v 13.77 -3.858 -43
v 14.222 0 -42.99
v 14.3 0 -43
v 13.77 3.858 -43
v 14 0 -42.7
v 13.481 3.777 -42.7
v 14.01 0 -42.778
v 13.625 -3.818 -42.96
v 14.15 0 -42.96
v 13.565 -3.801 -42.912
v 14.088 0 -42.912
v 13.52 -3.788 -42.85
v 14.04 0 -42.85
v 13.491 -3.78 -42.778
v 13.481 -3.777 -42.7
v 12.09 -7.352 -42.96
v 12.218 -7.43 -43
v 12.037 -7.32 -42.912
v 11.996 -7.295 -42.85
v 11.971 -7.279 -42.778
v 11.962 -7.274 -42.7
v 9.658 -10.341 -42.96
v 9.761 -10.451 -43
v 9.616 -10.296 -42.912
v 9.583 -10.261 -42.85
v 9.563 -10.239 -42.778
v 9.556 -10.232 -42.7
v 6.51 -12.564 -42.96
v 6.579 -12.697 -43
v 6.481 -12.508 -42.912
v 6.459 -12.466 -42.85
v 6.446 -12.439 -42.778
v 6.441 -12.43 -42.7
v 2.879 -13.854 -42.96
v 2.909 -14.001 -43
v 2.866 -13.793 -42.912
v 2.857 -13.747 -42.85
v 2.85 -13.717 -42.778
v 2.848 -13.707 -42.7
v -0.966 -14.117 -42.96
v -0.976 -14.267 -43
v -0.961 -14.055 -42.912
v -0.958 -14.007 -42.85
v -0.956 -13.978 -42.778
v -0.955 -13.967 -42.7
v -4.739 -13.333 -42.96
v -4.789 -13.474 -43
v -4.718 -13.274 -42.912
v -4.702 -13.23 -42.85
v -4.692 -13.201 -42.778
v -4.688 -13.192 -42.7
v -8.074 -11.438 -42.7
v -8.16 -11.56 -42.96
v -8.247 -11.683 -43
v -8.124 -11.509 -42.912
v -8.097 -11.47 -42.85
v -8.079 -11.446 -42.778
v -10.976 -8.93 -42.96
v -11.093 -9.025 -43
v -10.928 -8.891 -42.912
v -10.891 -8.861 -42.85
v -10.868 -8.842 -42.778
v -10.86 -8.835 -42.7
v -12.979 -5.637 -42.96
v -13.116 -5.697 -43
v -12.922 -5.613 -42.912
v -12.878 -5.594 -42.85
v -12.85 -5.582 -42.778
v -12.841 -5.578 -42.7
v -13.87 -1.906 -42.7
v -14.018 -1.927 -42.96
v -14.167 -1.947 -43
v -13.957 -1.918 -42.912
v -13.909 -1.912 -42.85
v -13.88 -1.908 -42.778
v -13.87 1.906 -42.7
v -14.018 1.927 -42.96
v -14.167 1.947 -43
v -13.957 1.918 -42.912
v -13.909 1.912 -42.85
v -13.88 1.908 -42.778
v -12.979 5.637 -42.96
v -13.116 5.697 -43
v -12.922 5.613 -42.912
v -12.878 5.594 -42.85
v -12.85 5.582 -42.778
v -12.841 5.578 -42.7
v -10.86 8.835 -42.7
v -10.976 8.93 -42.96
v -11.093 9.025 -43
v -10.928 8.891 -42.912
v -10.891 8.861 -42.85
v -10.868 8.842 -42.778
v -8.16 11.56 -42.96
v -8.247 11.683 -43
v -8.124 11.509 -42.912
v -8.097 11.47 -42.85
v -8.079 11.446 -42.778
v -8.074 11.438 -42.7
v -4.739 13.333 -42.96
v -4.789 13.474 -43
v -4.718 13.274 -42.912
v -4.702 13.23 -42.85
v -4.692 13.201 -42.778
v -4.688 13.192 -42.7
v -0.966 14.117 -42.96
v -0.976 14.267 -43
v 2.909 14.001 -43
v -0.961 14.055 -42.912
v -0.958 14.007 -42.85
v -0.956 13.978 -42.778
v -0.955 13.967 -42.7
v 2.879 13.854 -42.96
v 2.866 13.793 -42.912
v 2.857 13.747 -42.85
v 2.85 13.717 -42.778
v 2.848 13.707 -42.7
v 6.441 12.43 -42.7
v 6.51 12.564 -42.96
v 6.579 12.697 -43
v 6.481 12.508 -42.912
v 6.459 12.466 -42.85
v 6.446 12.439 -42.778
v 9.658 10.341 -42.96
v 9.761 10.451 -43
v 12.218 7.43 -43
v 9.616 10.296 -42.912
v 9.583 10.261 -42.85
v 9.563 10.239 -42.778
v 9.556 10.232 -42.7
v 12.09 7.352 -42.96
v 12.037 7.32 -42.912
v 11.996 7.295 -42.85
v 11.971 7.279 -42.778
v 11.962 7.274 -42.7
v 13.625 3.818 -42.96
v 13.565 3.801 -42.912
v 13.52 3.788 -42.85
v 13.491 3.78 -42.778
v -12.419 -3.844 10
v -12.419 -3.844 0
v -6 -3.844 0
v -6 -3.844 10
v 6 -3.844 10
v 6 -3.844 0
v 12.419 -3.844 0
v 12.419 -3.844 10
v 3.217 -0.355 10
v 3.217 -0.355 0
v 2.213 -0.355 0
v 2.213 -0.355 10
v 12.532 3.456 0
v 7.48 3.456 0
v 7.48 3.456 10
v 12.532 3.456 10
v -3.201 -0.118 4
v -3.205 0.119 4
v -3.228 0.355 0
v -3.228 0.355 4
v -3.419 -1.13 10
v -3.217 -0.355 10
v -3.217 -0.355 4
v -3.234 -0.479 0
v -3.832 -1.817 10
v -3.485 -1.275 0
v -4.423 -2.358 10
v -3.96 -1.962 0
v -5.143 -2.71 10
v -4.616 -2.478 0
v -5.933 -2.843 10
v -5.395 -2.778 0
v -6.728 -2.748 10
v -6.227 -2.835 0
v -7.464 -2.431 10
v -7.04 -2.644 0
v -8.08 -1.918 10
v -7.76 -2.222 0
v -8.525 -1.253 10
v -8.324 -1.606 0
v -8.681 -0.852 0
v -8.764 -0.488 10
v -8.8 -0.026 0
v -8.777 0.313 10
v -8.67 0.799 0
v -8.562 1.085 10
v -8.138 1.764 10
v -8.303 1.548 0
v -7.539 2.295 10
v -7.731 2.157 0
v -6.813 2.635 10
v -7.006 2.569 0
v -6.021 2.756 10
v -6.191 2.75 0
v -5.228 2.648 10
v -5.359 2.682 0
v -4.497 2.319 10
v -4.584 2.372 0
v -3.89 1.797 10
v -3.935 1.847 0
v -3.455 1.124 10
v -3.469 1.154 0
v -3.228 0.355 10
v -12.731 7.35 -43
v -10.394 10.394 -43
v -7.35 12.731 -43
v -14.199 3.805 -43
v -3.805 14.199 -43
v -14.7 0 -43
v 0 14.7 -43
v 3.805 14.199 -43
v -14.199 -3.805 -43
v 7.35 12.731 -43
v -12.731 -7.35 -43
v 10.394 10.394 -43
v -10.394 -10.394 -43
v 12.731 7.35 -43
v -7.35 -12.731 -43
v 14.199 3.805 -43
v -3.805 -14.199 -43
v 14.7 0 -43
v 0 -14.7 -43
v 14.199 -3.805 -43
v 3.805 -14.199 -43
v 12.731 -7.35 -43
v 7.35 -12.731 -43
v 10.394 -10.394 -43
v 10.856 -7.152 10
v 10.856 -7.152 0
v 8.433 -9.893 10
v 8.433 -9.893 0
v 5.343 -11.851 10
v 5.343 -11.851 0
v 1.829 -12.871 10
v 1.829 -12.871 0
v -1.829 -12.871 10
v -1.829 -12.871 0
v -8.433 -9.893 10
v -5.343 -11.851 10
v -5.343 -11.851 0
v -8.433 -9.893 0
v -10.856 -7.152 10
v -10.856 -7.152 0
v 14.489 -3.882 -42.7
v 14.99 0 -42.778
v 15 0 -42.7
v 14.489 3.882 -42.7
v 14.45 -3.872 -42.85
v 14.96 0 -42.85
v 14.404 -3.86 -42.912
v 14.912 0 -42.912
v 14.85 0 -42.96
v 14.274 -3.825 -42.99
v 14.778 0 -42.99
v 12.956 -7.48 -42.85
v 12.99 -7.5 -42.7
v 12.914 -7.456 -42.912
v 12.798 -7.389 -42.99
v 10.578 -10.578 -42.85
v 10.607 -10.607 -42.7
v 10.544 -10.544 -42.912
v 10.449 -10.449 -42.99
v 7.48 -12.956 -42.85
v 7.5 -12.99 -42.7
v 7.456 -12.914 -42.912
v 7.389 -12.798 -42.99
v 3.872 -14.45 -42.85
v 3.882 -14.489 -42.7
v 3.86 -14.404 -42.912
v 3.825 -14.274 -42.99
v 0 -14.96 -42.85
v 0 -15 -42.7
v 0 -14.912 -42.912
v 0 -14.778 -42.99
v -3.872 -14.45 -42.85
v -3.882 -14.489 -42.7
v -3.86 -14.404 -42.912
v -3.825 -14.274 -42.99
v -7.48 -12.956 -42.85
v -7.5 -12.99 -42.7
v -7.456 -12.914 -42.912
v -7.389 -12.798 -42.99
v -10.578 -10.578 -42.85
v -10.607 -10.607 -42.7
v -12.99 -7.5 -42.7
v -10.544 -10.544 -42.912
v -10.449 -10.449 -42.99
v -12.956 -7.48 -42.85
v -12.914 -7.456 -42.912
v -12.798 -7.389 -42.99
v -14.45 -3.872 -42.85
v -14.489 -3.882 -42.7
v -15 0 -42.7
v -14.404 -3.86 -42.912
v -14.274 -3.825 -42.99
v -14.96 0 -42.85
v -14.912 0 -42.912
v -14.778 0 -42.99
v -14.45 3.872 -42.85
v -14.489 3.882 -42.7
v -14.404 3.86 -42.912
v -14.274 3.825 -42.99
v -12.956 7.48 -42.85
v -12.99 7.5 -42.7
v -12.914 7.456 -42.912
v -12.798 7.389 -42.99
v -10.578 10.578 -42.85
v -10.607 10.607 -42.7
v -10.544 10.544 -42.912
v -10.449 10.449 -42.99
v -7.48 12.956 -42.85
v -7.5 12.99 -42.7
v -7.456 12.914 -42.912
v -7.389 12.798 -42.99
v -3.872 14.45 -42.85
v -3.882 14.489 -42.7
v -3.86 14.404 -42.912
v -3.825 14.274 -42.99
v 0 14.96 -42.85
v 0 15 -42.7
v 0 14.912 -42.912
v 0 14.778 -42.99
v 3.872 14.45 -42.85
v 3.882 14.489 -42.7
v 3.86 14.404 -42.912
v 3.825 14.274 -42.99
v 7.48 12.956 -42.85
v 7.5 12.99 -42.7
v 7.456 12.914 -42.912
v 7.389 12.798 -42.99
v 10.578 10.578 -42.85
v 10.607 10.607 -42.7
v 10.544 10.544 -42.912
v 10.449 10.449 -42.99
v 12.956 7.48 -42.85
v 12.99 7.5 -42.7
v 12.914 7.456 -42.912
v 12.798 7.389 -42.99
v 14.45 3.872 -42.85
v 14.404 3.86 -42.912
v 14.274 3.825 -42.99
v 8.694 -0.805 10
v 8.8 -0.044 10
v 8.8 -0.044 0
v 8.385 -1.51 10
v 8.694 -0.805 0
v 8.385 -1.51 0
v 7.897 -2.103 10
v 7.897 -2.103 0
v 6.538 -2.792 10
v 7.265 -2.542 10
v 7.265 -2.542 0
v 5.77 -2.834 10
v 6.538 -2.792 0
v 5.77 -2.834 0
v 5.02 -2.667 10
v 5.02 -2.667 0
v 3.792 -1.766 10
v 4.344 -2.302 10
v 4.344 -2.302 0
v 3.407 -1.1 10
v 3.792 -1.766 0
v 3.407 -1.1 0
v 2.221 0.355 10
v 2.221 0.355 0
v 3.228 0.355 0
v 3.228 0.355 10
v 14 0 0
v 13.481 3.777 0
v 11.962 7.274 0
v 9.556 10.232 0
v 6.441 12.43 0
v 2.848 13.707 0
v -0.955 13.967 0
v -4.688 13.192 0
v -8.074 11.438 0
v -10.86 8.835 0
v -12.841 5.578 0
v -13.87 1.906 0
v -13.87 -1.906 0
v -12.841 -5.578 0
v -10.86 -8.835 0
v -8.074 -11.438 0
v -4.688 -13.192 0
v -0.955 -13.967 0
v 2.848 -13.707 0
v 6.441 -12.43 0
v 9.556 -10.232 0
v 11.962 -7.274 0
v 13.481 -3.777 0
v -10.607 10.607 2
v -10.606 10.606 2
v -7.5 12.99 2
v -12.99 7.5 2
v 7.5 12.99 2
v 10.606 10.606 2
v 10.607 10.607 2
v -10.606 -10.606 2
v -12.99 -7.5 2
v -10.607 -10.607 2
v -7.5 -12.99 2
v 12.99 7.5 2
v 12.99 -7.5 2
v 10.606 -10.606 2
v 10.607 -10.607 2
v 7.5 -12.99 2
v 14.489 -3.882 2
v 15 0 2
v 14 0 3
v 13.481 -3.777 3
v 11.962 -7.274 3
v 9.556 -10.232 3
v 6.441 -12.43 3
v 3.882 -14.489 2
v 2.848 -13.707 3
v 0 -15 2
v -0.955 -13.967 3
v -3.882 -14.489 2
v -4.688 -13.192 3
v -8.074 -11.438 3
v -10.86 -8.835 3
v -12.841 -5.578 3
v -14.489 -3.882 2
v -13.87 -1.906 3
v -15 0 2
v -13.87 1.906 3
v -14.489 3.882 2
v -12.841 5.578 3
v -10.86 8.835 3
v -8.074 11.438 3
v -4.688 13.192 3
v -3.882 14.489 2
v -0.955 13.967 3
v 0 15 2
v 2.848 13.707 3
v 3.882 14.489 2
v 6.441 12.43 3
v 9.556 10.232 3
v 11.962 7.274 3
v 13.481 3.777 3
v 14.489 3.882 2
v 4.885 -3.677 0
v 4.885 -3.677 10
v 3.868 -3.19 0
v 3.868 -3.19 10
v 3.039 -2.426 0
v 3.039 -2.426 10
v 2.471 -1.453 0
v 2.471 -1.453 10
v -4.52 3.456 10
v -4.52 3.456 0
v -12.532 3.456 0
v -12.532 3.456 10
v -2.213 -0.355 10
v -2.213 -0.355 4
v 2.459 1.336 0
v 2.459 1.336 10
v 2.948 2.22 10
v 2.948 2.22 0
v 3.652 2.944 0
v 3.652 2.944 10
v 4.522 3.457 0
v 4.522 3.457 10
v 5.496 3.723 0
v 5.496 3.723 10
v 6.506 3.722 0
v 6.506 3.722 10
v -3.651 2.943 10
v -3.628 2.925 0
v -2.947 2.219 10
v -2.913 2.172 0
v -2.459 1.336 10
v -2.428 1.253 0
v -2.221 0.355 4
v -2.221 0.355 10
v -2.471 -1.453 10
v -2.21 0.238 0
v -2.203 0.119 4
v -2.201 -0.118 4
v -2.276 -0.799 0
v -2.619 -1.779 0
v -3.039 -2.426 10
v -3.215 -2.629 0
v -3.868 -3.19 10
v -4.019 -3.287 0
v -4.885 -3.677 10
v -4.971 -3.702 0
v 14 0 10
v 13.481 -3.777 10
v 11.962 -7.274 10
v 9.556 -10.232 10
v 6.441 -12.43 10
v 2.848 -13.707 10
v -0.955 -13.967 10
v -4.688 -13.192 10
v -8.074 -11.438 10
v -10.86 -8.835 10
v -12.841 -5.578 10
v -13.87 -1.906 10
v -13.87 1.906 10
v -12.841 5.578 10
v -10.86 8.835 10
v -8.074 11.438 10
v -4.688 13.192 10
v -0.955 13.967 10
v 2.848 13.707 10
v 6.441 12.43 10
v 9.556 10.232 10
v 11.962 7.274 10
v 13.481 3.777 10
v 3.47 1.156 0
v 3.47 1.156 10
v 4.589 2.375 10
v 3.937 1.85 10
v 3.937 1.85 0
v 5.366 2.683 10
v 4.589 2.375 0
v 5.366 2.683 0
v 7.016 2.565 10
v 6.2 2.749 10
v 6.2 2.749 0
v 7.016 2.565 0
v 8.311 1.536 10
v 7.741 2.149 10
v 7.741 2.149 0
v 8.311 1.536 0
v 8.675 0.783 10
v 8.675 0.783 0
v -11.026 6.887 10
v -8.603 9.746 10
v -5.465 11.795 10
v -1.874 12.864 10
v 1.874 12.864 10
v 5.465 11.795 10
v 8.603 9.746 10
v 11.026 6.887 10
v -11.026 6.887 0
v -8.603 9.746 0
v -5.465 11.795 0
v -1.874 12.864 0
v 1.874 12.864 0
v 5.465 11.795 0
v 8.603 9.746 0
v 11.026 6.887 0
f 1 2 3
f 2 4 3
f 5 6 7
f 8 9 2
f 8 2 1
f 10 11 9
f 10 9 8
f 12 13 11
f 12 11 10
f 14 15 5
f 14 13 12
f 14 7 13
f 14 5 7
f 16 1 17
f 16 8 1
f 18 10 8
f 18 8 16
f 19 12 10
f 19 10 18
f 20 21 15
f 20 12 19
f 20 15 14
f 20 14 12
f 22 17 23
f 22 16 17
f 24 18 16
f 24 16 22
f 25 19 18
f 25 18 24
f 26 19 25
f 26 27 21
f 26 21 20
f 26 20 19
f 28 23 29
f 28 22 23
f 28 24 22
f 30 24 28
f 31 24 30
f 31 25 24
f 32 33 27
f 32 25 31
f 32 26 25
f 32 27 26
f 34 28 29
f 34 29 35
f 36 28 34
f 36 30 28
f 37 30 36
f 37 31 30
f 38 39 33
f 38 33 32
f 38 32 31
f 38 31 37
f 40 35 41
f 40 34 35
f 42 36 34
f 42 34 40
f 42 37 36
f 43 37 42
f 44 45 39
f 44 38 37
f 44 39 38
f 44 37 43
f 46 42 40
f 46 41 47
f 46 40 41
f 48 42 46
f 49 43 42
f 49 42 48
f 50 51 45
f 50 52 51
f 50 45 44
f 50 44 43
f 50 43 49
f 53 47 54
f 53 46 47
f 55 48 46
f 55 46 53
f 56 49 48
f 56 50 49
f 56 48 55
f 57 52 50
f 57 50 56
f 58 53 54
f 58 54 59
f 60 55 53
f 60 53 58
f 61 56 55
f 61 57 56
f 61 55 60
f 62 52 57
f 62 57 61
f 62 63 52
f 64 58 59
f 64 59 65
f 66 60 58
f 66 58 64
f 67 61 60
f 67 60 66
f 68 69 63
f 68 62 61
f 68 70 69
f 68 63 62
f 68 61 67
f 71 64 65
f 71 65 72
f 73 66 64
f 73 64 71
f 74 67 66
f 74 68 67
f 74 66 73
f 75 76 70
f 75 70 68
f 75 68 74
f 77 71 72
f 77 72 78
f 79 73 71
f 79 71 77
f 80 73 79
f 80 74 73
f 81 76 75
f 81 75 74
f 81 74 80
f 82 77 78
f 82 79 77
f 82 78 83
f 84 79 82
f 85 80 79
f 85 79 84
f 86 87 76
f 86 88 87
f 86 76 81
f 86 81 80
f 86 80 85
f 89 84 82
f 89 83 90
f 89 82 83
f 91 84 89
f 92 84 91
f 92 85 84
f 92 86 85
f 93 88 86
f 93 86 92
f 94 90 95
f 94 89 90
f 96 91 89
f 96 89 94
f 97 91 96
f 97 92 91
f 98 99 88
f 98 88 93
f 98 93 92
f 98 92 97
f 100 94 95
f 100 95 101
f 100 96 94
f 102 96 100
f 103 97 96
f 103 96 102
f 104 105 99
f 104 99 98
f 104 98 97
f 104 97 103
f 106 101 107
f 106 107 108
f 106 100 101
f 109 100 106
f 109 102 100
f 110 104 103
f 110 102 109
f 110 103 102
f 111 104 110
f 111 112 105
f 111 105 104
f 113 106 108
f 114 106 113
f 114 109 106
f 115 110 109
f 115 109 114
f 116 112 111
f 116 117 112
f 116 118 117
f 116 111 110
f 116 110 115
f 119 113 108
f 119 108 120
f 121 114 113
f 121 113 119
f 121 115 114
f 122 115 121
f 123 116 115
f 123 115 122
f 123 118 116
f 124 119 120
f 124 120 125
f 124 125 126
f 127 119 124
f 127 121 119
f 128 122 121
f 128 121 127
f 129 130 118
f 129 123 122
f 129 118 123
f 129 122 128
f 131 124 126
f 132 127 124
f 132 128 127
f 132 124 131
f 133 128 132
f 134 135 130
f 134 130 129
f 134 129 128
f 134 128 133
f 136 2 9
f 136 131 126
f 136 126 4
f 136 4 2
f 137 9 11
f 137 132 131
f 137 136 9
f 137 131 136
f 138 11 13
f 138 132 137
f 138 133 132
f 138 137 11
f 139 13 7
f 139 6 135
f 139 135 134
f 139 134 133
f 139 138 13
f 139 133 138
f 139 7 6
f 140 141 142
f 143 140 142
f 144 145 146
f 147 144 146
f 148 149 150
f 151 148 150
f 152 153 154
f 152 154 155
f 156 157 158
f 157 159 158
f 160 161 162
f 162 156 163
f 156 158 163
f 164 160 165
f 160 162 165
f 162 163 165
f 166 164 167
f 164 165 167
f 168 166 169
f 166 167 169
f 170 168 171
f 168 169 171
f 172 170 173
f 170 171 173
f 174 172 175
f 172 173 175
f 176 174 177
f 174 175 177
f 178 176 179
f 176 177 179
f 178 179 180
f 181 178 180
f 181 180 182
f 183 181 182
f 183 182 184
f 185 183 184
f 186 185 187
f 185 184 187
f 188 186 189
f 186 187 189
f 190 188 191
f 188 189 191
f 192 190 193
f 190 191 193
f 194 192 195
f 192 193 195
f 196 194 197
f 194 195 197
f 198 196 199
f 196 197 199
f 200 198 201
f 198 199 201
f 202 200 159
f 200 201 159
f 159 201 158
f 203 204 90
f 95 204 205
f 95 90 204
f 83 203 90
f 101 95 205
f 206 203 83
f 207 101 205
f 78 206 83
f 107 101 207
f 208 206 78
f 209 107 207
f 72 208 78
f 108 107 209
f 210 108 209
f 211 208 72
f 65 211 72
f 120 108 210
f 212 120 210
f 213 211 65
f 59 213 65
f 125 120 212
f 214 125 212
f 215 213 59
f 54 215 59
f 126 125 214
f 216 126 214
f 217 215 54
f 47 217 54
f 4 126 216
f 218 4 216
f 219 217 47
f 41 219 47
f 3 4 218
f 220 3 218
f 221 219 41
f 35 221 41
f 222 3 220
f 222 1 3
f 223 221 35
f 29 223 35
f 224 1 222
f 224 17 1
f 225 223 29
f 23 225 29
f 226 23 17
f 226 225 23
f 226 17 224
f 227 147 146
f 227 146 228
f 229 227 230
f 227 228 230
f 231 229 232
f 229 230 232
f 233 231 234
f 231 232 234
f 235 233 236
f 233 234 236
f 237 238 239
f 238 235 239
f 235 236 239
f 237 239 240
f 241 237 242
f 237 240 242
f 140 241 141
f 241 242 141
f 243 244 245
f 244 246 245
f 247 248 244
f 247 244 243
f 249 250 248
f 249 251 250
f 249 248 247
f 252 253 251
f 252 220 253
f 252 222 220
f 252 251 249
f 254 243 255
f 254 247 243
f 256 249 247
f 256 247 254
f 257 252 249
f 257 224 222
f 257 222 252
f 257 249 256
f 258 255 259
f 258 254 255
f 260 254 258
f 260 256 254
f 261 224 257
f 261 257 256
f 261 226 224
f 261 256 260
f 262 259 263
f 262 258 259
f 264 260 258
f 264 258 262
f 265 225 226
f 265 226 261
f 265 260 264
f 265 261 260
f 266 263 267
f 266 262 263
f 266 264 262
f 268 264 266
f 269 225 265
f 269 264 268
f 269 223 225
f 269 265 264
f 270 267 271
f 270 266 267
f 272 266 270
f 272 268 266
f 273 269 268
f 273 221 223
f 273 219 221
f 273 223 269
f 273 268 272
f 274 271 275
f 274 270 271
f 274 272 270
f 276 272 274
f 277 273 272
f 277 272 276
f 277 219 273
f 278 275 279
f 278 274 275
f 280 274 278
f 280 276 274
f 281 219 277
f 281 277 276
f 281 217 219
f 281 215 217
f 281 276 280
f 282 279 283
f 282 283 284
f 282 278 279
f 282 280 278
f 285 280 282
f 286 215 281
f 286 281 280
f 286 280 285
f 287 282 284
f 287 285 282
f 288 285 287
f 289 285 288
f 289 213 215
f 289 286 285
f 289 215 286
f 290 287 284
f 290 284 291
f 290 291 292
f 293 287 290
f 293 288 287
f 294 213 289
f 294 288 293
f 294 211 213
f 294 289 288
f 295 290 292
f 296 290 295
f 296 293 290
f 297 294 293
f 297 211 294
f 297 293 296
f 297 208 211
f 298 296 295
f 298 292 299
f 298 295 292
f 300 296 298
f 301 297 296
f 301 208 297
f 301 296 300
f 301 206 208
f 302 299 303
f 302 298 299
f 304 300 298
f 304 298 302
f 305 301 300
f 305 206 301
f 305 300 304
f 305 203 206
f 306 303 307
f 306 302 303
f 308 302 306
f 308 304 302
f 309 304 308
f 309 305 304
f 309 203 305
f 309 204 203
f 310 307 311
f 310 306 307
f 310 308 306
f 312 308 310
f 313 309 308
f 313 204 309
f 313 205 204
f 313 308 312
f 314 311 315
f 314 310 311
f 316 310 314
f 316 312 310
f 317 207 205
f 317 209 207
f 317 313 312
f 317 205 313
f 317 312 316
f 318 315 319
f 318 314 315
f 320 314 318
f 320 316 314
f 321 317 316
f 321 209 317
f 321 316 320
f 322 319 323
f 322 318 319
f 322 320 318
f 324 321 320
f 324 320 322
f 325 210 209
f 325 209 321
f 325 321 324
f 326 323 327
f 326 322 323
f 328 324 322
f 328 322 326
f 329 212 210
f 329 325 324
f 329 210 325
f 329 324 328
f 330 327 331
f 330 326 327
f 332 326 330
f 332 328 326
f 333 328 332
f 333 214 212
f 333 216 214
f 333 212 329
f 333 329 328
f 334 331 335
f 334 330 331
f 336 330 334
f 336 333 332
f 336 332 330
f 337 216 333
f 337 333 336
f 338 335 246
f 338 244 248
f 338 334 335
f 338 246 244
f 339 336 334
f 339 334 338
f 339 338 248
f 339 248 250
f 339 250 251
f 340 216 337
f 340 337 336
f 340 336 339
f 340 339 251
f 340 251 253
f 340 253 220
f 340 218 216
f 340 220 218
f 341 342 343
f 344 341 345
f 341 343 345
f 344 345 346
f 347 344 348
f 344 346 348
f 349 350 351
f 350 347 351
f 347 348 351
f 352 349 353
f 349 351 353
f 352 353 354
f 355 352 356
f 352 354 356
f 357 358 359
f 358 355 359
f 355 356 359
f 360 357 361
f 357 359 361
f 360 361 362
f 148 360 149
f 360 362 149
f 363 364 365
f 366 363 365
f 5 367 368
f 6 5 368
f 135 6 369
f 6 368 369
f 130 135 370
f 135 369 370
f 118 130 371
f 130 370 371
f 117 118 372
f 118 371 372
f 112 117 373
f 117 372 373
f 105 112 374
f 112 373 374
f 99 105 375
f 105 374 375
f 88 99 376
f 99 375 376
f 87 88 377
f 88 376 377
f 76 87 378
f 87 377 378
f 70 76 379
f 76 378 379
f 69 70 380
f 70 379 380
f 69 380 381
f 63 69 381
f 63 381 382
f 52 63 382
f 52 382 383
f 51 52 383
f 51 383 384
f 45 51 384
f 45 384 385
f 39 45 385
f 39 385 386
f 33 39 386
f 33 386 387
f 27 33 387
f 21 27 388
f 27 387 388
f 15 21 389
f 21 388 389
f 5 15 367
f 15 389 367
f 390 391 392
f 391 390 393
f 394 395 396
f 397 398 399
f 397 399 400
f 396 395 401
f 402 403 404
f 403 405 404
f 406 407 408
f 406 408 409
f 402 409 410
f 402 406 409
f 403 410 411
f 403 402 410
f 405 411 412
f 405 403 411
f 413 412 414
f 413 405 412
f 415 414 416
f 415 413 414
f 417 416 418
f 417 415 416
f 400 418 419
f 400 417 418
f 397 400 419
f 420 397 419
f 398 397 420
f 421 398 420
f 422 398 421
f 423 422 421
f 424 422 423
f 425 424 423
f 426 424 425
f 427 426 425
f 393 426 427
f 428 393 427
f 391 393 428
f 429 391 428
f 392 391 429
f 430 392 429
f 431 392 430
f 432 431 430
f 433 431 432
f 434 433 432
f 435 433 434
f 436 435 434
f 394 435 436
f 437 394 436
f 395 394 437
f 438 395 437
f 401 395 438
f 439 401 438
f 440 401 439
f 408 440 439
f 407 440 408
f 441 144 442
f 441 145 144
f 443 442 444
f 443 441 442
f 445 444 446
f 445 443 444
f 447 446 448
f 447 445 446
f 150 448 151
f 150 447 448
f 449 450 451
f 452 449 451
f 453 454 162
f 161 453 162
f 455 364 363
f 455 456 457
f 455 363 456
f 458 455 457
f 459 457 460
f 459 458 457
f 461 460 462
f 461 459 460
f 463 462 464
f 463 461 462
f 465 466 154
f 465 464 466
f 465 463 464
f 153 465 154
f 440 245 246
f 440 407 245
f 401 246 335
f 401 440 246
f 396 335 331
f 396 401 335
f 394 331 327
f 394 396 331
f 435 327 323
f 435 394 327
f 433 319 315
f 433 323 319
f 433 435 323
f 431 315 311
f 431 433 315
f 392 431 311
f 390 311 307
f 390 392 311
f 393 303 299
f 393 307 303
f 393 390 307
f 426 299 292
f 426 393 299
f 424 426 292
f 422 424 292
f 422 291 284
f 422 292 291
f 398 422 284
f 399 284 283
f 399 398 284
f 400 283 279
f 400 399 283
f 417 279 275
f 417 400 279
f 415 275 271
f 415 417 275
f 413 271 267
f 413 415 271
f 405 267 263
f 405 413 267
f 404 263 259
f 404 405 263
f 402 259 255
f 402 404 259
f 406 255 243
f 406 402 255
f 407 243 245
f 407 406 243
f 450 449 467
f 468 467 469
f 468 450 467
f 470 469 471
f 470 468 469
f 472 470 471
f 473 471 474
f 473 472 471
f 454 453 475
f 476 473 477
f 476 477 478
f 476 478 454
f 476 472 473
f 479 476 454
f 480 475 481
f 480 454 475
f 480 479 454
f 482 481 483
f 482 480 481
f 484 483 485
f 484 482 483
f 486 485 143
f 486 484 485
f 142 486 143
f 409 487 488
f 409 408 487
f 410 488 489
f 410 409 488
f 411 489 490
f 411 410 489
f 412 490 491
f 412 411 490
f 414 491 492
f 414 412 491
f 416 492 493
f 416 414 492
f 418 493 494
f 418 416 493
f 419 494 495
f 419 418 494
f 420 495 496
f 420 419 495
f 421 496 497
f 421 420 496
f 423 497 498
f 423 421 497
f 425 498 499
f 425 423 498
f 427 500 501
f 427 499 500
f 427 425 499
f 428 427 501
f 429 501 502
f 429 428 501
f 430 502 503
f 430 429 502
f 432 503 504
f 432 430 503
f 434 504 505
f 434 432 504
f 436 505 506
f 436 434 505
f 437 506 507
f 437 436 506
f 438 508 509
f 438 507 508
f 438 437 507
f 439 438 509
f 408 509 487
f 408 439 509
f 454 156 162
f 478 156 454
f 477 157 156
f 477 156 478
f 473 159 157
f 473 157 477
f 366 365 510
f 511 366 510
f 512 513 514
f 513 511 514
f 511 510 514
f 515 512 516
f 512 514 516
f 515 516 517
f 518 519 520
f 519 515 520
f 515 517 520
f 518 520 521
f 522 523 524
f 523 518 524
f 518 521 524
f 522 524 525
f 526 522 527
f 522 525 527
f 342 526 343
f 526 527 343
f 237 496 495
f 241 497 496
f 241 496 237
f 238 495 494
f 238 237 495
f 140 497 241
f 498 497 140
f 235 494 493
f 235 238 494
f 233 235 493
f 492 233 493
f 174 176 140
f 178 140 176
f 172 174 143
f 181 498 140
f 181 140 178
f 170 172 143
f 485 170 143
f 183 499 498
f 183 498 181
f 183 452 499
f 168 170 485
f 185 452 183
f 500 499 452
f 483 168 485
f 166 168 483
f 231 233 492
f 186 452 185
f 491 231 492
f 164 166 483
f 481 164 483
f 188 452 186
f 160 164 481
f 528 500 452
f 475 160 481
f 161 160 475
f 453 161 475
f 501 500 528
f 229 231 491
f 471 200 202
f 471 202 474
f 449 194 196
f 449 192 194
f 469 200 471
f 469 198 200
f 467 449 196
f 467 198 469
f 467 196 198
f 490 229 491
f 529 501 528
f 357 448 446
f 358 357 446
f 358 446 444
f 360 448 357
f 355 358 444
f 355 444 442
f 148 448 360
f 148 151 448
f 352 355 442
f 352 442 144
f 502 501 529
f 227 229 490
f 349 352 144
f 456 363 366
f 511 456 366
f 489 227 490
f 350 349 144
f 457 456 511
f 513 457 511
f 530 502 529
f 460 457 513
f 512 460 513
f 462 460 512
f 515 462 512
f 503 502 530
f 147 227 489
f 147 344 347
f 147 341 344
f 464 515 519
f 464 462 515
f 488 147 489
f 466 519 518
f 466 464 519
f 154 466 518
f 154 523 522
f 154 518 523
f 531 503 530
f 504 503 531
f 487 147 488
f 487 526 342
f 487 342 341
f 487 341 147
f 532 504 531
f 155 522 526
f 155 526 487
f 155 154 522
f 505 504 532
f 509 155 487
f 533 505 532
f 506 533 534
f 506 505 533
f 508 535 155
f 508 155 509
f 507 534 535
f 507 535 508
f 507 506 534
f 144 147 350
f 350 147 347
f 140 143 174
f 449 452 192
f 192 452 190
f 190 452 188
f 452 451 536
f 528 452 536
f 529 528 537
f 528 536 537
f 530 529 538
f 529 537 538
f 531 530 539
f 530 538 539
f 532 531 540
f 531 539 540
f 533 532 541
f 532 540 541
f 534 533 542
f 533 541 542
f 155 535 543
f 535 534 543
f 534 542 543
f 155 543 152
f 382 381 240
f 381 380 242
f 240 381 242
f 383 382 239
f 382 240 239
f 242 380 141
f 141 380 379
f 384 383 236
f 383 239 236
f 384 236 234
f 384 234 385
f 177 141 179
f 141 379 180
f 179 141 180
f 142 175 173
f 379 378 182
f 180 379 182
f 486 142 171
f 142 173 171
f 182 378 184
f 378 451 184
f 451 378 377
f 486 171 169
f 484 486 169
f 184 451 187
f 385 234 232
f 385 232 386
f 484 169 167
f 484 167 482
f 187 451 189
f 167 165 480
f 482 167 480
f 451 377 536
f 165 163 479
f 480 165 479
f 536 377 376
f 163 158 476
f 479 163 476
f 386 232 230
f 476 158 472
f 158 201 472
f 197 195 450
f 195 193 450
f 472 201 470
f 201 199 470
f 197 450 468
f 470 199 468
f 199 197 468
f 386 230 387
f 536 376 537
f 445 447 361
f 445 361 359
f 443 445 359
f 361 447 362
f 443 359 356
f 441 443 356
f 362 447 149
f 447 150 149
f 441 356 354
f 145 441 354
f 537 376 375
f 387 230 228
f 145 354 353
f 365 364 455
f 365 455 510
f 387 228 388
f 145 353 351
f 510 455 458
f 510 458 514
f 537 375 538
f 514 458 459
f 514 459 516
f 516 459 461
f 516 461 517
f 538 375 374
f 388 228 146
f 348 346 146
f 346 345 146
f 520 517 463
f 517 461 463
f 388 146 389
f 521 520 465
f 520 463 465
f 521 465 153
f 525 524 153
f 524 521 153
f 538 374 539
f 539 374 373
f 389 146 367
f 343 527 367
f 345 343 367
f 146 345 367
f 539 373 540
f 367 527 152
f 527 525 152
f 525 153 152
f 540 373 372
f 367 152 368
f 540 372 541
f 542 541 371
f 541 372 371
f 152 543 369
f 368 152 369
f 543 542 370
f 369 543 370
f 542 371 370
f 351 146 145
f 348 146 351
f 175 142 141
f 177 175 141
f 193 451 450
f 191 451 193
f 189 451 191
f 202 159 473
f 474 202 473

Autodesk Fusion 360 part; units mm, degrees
sketch "Sketch1" plane through (0, 0, 0) normal (0, 0, 1) x (1, 0, 0)
  circle A0 centre (0, 0) radius 13
  circle A1 centre (0, 0) radius 14
  circle A2 centre (0, 0) radius 6 construction
  line L0 (-18, -0.0439) -> (20, -0.0439) construction
  line L1 (0, 17) -> (0, -15) construction
  circle A3 centre (-5.9998, -0.0439) radius 2.8
  circle A4 centre (5.9998, -0.0439) radius 2.8
  circle A5 centre (5.9998, -0.0439) radius 3.8
  circle A6 centre (-5.9998, -0.0439) radius 3.8
  line L2 (-18, -0.0439) -> (-18, 3.4561) construction
  line L3 (-18, 3.4561) -> (29, 3.4561) construction
  line L4 (-25, -0.3439) -> (-25, -3.8439) construction
  line L5 (-25, -3.8439) -> (28, -3.8439) construction
  line L6 (-4.52, 3.4561) -> (-12.5322, 3.4561)
  line L7 (-12.4187, -3.8439) -> (-5.9998, -3.8439)
  line L8 (7.4797, 3.4561) -> (12.5322, 3.4561)
  line L9 (5.9998, -3.8439) -> (12.4187, -3.8439)
  line L10 (6.6591, -0.3553) -> (-6.6591, -0.3553)
  line L11 (-6.6591, -0.3553) -> (-6.6591, 0.3553)
  line L12 (-6.6591, 0.3553) -> (6.6591, 0.3553)
  line L13 (6.6591, 0.3553) -> (6.6591, -0.3553)
  line L14 (6.6591, -0.3553) -> (-6.6591, 0.3553) construction
  line L15 (-6.6591, -0.3553) -> (6.6591, 0.3553) construction
  dimension "d1" = 26
  dimension "d2" = 28
  dimension "d3" = 12
  dimension "d4" = 5.6
  dimension "d5" = 5.6
  dimension "d6" = 7.6
  dimension "d7" = 7.6
  dimension "d8" = 3.5
  dimension "d9" = 47
  dimension "d10" = 3.5
  dimension "d11" = 53
  dimension "d12" = 0.7105
extrude "Extrude3" add sketch "Sketch1" along normal blind 10 contours A0 A5 L8 L9 | A0 A6 L6 L7 | A4 A5 L10 L12 | A3 A6 L6 L10 L12 | A1 picked at (2.5768, -0.5414) makes body 1
extrude "Extrude1" add sketch "Sketch1" along normal blind 4 separate body contours A0 A5 L8 L9 | A0 A6 L6 L7 | A4 A5 L10 L12 | A1 picked at (2.5768, -0.5414) makes body 2
ref_plane "WorkPlane1" through (0, 0, 2) normal (0, 0, -1) x (-1, 0, 0)
sketch "Sketch2" plane through (0, 0, 2) normal (0, 0, -1) x (1, 0, 0)
  circle A0 centre (0, 0) radius 15
  circle A1 centre (0, 0) radius 14
  dimension "d16" = 30
  dimension "d17" = 28
extrude "Extrude2" add sketch "Sketch2" along normal blind 45 bodies 2 1
fillet "Fillet1" radius 0.3 1 edges at (-13.9849, 5.4242, -43) on bodies 2
fillet "Fillet2" radius 0.3 1 edges at (-13.0526, -5.0626, -43) on bodies 2
chamfer "Chamfer1" distance 1 angle 45 1 edges at (-13.0526, -5.0626, 2) on bodies 2
